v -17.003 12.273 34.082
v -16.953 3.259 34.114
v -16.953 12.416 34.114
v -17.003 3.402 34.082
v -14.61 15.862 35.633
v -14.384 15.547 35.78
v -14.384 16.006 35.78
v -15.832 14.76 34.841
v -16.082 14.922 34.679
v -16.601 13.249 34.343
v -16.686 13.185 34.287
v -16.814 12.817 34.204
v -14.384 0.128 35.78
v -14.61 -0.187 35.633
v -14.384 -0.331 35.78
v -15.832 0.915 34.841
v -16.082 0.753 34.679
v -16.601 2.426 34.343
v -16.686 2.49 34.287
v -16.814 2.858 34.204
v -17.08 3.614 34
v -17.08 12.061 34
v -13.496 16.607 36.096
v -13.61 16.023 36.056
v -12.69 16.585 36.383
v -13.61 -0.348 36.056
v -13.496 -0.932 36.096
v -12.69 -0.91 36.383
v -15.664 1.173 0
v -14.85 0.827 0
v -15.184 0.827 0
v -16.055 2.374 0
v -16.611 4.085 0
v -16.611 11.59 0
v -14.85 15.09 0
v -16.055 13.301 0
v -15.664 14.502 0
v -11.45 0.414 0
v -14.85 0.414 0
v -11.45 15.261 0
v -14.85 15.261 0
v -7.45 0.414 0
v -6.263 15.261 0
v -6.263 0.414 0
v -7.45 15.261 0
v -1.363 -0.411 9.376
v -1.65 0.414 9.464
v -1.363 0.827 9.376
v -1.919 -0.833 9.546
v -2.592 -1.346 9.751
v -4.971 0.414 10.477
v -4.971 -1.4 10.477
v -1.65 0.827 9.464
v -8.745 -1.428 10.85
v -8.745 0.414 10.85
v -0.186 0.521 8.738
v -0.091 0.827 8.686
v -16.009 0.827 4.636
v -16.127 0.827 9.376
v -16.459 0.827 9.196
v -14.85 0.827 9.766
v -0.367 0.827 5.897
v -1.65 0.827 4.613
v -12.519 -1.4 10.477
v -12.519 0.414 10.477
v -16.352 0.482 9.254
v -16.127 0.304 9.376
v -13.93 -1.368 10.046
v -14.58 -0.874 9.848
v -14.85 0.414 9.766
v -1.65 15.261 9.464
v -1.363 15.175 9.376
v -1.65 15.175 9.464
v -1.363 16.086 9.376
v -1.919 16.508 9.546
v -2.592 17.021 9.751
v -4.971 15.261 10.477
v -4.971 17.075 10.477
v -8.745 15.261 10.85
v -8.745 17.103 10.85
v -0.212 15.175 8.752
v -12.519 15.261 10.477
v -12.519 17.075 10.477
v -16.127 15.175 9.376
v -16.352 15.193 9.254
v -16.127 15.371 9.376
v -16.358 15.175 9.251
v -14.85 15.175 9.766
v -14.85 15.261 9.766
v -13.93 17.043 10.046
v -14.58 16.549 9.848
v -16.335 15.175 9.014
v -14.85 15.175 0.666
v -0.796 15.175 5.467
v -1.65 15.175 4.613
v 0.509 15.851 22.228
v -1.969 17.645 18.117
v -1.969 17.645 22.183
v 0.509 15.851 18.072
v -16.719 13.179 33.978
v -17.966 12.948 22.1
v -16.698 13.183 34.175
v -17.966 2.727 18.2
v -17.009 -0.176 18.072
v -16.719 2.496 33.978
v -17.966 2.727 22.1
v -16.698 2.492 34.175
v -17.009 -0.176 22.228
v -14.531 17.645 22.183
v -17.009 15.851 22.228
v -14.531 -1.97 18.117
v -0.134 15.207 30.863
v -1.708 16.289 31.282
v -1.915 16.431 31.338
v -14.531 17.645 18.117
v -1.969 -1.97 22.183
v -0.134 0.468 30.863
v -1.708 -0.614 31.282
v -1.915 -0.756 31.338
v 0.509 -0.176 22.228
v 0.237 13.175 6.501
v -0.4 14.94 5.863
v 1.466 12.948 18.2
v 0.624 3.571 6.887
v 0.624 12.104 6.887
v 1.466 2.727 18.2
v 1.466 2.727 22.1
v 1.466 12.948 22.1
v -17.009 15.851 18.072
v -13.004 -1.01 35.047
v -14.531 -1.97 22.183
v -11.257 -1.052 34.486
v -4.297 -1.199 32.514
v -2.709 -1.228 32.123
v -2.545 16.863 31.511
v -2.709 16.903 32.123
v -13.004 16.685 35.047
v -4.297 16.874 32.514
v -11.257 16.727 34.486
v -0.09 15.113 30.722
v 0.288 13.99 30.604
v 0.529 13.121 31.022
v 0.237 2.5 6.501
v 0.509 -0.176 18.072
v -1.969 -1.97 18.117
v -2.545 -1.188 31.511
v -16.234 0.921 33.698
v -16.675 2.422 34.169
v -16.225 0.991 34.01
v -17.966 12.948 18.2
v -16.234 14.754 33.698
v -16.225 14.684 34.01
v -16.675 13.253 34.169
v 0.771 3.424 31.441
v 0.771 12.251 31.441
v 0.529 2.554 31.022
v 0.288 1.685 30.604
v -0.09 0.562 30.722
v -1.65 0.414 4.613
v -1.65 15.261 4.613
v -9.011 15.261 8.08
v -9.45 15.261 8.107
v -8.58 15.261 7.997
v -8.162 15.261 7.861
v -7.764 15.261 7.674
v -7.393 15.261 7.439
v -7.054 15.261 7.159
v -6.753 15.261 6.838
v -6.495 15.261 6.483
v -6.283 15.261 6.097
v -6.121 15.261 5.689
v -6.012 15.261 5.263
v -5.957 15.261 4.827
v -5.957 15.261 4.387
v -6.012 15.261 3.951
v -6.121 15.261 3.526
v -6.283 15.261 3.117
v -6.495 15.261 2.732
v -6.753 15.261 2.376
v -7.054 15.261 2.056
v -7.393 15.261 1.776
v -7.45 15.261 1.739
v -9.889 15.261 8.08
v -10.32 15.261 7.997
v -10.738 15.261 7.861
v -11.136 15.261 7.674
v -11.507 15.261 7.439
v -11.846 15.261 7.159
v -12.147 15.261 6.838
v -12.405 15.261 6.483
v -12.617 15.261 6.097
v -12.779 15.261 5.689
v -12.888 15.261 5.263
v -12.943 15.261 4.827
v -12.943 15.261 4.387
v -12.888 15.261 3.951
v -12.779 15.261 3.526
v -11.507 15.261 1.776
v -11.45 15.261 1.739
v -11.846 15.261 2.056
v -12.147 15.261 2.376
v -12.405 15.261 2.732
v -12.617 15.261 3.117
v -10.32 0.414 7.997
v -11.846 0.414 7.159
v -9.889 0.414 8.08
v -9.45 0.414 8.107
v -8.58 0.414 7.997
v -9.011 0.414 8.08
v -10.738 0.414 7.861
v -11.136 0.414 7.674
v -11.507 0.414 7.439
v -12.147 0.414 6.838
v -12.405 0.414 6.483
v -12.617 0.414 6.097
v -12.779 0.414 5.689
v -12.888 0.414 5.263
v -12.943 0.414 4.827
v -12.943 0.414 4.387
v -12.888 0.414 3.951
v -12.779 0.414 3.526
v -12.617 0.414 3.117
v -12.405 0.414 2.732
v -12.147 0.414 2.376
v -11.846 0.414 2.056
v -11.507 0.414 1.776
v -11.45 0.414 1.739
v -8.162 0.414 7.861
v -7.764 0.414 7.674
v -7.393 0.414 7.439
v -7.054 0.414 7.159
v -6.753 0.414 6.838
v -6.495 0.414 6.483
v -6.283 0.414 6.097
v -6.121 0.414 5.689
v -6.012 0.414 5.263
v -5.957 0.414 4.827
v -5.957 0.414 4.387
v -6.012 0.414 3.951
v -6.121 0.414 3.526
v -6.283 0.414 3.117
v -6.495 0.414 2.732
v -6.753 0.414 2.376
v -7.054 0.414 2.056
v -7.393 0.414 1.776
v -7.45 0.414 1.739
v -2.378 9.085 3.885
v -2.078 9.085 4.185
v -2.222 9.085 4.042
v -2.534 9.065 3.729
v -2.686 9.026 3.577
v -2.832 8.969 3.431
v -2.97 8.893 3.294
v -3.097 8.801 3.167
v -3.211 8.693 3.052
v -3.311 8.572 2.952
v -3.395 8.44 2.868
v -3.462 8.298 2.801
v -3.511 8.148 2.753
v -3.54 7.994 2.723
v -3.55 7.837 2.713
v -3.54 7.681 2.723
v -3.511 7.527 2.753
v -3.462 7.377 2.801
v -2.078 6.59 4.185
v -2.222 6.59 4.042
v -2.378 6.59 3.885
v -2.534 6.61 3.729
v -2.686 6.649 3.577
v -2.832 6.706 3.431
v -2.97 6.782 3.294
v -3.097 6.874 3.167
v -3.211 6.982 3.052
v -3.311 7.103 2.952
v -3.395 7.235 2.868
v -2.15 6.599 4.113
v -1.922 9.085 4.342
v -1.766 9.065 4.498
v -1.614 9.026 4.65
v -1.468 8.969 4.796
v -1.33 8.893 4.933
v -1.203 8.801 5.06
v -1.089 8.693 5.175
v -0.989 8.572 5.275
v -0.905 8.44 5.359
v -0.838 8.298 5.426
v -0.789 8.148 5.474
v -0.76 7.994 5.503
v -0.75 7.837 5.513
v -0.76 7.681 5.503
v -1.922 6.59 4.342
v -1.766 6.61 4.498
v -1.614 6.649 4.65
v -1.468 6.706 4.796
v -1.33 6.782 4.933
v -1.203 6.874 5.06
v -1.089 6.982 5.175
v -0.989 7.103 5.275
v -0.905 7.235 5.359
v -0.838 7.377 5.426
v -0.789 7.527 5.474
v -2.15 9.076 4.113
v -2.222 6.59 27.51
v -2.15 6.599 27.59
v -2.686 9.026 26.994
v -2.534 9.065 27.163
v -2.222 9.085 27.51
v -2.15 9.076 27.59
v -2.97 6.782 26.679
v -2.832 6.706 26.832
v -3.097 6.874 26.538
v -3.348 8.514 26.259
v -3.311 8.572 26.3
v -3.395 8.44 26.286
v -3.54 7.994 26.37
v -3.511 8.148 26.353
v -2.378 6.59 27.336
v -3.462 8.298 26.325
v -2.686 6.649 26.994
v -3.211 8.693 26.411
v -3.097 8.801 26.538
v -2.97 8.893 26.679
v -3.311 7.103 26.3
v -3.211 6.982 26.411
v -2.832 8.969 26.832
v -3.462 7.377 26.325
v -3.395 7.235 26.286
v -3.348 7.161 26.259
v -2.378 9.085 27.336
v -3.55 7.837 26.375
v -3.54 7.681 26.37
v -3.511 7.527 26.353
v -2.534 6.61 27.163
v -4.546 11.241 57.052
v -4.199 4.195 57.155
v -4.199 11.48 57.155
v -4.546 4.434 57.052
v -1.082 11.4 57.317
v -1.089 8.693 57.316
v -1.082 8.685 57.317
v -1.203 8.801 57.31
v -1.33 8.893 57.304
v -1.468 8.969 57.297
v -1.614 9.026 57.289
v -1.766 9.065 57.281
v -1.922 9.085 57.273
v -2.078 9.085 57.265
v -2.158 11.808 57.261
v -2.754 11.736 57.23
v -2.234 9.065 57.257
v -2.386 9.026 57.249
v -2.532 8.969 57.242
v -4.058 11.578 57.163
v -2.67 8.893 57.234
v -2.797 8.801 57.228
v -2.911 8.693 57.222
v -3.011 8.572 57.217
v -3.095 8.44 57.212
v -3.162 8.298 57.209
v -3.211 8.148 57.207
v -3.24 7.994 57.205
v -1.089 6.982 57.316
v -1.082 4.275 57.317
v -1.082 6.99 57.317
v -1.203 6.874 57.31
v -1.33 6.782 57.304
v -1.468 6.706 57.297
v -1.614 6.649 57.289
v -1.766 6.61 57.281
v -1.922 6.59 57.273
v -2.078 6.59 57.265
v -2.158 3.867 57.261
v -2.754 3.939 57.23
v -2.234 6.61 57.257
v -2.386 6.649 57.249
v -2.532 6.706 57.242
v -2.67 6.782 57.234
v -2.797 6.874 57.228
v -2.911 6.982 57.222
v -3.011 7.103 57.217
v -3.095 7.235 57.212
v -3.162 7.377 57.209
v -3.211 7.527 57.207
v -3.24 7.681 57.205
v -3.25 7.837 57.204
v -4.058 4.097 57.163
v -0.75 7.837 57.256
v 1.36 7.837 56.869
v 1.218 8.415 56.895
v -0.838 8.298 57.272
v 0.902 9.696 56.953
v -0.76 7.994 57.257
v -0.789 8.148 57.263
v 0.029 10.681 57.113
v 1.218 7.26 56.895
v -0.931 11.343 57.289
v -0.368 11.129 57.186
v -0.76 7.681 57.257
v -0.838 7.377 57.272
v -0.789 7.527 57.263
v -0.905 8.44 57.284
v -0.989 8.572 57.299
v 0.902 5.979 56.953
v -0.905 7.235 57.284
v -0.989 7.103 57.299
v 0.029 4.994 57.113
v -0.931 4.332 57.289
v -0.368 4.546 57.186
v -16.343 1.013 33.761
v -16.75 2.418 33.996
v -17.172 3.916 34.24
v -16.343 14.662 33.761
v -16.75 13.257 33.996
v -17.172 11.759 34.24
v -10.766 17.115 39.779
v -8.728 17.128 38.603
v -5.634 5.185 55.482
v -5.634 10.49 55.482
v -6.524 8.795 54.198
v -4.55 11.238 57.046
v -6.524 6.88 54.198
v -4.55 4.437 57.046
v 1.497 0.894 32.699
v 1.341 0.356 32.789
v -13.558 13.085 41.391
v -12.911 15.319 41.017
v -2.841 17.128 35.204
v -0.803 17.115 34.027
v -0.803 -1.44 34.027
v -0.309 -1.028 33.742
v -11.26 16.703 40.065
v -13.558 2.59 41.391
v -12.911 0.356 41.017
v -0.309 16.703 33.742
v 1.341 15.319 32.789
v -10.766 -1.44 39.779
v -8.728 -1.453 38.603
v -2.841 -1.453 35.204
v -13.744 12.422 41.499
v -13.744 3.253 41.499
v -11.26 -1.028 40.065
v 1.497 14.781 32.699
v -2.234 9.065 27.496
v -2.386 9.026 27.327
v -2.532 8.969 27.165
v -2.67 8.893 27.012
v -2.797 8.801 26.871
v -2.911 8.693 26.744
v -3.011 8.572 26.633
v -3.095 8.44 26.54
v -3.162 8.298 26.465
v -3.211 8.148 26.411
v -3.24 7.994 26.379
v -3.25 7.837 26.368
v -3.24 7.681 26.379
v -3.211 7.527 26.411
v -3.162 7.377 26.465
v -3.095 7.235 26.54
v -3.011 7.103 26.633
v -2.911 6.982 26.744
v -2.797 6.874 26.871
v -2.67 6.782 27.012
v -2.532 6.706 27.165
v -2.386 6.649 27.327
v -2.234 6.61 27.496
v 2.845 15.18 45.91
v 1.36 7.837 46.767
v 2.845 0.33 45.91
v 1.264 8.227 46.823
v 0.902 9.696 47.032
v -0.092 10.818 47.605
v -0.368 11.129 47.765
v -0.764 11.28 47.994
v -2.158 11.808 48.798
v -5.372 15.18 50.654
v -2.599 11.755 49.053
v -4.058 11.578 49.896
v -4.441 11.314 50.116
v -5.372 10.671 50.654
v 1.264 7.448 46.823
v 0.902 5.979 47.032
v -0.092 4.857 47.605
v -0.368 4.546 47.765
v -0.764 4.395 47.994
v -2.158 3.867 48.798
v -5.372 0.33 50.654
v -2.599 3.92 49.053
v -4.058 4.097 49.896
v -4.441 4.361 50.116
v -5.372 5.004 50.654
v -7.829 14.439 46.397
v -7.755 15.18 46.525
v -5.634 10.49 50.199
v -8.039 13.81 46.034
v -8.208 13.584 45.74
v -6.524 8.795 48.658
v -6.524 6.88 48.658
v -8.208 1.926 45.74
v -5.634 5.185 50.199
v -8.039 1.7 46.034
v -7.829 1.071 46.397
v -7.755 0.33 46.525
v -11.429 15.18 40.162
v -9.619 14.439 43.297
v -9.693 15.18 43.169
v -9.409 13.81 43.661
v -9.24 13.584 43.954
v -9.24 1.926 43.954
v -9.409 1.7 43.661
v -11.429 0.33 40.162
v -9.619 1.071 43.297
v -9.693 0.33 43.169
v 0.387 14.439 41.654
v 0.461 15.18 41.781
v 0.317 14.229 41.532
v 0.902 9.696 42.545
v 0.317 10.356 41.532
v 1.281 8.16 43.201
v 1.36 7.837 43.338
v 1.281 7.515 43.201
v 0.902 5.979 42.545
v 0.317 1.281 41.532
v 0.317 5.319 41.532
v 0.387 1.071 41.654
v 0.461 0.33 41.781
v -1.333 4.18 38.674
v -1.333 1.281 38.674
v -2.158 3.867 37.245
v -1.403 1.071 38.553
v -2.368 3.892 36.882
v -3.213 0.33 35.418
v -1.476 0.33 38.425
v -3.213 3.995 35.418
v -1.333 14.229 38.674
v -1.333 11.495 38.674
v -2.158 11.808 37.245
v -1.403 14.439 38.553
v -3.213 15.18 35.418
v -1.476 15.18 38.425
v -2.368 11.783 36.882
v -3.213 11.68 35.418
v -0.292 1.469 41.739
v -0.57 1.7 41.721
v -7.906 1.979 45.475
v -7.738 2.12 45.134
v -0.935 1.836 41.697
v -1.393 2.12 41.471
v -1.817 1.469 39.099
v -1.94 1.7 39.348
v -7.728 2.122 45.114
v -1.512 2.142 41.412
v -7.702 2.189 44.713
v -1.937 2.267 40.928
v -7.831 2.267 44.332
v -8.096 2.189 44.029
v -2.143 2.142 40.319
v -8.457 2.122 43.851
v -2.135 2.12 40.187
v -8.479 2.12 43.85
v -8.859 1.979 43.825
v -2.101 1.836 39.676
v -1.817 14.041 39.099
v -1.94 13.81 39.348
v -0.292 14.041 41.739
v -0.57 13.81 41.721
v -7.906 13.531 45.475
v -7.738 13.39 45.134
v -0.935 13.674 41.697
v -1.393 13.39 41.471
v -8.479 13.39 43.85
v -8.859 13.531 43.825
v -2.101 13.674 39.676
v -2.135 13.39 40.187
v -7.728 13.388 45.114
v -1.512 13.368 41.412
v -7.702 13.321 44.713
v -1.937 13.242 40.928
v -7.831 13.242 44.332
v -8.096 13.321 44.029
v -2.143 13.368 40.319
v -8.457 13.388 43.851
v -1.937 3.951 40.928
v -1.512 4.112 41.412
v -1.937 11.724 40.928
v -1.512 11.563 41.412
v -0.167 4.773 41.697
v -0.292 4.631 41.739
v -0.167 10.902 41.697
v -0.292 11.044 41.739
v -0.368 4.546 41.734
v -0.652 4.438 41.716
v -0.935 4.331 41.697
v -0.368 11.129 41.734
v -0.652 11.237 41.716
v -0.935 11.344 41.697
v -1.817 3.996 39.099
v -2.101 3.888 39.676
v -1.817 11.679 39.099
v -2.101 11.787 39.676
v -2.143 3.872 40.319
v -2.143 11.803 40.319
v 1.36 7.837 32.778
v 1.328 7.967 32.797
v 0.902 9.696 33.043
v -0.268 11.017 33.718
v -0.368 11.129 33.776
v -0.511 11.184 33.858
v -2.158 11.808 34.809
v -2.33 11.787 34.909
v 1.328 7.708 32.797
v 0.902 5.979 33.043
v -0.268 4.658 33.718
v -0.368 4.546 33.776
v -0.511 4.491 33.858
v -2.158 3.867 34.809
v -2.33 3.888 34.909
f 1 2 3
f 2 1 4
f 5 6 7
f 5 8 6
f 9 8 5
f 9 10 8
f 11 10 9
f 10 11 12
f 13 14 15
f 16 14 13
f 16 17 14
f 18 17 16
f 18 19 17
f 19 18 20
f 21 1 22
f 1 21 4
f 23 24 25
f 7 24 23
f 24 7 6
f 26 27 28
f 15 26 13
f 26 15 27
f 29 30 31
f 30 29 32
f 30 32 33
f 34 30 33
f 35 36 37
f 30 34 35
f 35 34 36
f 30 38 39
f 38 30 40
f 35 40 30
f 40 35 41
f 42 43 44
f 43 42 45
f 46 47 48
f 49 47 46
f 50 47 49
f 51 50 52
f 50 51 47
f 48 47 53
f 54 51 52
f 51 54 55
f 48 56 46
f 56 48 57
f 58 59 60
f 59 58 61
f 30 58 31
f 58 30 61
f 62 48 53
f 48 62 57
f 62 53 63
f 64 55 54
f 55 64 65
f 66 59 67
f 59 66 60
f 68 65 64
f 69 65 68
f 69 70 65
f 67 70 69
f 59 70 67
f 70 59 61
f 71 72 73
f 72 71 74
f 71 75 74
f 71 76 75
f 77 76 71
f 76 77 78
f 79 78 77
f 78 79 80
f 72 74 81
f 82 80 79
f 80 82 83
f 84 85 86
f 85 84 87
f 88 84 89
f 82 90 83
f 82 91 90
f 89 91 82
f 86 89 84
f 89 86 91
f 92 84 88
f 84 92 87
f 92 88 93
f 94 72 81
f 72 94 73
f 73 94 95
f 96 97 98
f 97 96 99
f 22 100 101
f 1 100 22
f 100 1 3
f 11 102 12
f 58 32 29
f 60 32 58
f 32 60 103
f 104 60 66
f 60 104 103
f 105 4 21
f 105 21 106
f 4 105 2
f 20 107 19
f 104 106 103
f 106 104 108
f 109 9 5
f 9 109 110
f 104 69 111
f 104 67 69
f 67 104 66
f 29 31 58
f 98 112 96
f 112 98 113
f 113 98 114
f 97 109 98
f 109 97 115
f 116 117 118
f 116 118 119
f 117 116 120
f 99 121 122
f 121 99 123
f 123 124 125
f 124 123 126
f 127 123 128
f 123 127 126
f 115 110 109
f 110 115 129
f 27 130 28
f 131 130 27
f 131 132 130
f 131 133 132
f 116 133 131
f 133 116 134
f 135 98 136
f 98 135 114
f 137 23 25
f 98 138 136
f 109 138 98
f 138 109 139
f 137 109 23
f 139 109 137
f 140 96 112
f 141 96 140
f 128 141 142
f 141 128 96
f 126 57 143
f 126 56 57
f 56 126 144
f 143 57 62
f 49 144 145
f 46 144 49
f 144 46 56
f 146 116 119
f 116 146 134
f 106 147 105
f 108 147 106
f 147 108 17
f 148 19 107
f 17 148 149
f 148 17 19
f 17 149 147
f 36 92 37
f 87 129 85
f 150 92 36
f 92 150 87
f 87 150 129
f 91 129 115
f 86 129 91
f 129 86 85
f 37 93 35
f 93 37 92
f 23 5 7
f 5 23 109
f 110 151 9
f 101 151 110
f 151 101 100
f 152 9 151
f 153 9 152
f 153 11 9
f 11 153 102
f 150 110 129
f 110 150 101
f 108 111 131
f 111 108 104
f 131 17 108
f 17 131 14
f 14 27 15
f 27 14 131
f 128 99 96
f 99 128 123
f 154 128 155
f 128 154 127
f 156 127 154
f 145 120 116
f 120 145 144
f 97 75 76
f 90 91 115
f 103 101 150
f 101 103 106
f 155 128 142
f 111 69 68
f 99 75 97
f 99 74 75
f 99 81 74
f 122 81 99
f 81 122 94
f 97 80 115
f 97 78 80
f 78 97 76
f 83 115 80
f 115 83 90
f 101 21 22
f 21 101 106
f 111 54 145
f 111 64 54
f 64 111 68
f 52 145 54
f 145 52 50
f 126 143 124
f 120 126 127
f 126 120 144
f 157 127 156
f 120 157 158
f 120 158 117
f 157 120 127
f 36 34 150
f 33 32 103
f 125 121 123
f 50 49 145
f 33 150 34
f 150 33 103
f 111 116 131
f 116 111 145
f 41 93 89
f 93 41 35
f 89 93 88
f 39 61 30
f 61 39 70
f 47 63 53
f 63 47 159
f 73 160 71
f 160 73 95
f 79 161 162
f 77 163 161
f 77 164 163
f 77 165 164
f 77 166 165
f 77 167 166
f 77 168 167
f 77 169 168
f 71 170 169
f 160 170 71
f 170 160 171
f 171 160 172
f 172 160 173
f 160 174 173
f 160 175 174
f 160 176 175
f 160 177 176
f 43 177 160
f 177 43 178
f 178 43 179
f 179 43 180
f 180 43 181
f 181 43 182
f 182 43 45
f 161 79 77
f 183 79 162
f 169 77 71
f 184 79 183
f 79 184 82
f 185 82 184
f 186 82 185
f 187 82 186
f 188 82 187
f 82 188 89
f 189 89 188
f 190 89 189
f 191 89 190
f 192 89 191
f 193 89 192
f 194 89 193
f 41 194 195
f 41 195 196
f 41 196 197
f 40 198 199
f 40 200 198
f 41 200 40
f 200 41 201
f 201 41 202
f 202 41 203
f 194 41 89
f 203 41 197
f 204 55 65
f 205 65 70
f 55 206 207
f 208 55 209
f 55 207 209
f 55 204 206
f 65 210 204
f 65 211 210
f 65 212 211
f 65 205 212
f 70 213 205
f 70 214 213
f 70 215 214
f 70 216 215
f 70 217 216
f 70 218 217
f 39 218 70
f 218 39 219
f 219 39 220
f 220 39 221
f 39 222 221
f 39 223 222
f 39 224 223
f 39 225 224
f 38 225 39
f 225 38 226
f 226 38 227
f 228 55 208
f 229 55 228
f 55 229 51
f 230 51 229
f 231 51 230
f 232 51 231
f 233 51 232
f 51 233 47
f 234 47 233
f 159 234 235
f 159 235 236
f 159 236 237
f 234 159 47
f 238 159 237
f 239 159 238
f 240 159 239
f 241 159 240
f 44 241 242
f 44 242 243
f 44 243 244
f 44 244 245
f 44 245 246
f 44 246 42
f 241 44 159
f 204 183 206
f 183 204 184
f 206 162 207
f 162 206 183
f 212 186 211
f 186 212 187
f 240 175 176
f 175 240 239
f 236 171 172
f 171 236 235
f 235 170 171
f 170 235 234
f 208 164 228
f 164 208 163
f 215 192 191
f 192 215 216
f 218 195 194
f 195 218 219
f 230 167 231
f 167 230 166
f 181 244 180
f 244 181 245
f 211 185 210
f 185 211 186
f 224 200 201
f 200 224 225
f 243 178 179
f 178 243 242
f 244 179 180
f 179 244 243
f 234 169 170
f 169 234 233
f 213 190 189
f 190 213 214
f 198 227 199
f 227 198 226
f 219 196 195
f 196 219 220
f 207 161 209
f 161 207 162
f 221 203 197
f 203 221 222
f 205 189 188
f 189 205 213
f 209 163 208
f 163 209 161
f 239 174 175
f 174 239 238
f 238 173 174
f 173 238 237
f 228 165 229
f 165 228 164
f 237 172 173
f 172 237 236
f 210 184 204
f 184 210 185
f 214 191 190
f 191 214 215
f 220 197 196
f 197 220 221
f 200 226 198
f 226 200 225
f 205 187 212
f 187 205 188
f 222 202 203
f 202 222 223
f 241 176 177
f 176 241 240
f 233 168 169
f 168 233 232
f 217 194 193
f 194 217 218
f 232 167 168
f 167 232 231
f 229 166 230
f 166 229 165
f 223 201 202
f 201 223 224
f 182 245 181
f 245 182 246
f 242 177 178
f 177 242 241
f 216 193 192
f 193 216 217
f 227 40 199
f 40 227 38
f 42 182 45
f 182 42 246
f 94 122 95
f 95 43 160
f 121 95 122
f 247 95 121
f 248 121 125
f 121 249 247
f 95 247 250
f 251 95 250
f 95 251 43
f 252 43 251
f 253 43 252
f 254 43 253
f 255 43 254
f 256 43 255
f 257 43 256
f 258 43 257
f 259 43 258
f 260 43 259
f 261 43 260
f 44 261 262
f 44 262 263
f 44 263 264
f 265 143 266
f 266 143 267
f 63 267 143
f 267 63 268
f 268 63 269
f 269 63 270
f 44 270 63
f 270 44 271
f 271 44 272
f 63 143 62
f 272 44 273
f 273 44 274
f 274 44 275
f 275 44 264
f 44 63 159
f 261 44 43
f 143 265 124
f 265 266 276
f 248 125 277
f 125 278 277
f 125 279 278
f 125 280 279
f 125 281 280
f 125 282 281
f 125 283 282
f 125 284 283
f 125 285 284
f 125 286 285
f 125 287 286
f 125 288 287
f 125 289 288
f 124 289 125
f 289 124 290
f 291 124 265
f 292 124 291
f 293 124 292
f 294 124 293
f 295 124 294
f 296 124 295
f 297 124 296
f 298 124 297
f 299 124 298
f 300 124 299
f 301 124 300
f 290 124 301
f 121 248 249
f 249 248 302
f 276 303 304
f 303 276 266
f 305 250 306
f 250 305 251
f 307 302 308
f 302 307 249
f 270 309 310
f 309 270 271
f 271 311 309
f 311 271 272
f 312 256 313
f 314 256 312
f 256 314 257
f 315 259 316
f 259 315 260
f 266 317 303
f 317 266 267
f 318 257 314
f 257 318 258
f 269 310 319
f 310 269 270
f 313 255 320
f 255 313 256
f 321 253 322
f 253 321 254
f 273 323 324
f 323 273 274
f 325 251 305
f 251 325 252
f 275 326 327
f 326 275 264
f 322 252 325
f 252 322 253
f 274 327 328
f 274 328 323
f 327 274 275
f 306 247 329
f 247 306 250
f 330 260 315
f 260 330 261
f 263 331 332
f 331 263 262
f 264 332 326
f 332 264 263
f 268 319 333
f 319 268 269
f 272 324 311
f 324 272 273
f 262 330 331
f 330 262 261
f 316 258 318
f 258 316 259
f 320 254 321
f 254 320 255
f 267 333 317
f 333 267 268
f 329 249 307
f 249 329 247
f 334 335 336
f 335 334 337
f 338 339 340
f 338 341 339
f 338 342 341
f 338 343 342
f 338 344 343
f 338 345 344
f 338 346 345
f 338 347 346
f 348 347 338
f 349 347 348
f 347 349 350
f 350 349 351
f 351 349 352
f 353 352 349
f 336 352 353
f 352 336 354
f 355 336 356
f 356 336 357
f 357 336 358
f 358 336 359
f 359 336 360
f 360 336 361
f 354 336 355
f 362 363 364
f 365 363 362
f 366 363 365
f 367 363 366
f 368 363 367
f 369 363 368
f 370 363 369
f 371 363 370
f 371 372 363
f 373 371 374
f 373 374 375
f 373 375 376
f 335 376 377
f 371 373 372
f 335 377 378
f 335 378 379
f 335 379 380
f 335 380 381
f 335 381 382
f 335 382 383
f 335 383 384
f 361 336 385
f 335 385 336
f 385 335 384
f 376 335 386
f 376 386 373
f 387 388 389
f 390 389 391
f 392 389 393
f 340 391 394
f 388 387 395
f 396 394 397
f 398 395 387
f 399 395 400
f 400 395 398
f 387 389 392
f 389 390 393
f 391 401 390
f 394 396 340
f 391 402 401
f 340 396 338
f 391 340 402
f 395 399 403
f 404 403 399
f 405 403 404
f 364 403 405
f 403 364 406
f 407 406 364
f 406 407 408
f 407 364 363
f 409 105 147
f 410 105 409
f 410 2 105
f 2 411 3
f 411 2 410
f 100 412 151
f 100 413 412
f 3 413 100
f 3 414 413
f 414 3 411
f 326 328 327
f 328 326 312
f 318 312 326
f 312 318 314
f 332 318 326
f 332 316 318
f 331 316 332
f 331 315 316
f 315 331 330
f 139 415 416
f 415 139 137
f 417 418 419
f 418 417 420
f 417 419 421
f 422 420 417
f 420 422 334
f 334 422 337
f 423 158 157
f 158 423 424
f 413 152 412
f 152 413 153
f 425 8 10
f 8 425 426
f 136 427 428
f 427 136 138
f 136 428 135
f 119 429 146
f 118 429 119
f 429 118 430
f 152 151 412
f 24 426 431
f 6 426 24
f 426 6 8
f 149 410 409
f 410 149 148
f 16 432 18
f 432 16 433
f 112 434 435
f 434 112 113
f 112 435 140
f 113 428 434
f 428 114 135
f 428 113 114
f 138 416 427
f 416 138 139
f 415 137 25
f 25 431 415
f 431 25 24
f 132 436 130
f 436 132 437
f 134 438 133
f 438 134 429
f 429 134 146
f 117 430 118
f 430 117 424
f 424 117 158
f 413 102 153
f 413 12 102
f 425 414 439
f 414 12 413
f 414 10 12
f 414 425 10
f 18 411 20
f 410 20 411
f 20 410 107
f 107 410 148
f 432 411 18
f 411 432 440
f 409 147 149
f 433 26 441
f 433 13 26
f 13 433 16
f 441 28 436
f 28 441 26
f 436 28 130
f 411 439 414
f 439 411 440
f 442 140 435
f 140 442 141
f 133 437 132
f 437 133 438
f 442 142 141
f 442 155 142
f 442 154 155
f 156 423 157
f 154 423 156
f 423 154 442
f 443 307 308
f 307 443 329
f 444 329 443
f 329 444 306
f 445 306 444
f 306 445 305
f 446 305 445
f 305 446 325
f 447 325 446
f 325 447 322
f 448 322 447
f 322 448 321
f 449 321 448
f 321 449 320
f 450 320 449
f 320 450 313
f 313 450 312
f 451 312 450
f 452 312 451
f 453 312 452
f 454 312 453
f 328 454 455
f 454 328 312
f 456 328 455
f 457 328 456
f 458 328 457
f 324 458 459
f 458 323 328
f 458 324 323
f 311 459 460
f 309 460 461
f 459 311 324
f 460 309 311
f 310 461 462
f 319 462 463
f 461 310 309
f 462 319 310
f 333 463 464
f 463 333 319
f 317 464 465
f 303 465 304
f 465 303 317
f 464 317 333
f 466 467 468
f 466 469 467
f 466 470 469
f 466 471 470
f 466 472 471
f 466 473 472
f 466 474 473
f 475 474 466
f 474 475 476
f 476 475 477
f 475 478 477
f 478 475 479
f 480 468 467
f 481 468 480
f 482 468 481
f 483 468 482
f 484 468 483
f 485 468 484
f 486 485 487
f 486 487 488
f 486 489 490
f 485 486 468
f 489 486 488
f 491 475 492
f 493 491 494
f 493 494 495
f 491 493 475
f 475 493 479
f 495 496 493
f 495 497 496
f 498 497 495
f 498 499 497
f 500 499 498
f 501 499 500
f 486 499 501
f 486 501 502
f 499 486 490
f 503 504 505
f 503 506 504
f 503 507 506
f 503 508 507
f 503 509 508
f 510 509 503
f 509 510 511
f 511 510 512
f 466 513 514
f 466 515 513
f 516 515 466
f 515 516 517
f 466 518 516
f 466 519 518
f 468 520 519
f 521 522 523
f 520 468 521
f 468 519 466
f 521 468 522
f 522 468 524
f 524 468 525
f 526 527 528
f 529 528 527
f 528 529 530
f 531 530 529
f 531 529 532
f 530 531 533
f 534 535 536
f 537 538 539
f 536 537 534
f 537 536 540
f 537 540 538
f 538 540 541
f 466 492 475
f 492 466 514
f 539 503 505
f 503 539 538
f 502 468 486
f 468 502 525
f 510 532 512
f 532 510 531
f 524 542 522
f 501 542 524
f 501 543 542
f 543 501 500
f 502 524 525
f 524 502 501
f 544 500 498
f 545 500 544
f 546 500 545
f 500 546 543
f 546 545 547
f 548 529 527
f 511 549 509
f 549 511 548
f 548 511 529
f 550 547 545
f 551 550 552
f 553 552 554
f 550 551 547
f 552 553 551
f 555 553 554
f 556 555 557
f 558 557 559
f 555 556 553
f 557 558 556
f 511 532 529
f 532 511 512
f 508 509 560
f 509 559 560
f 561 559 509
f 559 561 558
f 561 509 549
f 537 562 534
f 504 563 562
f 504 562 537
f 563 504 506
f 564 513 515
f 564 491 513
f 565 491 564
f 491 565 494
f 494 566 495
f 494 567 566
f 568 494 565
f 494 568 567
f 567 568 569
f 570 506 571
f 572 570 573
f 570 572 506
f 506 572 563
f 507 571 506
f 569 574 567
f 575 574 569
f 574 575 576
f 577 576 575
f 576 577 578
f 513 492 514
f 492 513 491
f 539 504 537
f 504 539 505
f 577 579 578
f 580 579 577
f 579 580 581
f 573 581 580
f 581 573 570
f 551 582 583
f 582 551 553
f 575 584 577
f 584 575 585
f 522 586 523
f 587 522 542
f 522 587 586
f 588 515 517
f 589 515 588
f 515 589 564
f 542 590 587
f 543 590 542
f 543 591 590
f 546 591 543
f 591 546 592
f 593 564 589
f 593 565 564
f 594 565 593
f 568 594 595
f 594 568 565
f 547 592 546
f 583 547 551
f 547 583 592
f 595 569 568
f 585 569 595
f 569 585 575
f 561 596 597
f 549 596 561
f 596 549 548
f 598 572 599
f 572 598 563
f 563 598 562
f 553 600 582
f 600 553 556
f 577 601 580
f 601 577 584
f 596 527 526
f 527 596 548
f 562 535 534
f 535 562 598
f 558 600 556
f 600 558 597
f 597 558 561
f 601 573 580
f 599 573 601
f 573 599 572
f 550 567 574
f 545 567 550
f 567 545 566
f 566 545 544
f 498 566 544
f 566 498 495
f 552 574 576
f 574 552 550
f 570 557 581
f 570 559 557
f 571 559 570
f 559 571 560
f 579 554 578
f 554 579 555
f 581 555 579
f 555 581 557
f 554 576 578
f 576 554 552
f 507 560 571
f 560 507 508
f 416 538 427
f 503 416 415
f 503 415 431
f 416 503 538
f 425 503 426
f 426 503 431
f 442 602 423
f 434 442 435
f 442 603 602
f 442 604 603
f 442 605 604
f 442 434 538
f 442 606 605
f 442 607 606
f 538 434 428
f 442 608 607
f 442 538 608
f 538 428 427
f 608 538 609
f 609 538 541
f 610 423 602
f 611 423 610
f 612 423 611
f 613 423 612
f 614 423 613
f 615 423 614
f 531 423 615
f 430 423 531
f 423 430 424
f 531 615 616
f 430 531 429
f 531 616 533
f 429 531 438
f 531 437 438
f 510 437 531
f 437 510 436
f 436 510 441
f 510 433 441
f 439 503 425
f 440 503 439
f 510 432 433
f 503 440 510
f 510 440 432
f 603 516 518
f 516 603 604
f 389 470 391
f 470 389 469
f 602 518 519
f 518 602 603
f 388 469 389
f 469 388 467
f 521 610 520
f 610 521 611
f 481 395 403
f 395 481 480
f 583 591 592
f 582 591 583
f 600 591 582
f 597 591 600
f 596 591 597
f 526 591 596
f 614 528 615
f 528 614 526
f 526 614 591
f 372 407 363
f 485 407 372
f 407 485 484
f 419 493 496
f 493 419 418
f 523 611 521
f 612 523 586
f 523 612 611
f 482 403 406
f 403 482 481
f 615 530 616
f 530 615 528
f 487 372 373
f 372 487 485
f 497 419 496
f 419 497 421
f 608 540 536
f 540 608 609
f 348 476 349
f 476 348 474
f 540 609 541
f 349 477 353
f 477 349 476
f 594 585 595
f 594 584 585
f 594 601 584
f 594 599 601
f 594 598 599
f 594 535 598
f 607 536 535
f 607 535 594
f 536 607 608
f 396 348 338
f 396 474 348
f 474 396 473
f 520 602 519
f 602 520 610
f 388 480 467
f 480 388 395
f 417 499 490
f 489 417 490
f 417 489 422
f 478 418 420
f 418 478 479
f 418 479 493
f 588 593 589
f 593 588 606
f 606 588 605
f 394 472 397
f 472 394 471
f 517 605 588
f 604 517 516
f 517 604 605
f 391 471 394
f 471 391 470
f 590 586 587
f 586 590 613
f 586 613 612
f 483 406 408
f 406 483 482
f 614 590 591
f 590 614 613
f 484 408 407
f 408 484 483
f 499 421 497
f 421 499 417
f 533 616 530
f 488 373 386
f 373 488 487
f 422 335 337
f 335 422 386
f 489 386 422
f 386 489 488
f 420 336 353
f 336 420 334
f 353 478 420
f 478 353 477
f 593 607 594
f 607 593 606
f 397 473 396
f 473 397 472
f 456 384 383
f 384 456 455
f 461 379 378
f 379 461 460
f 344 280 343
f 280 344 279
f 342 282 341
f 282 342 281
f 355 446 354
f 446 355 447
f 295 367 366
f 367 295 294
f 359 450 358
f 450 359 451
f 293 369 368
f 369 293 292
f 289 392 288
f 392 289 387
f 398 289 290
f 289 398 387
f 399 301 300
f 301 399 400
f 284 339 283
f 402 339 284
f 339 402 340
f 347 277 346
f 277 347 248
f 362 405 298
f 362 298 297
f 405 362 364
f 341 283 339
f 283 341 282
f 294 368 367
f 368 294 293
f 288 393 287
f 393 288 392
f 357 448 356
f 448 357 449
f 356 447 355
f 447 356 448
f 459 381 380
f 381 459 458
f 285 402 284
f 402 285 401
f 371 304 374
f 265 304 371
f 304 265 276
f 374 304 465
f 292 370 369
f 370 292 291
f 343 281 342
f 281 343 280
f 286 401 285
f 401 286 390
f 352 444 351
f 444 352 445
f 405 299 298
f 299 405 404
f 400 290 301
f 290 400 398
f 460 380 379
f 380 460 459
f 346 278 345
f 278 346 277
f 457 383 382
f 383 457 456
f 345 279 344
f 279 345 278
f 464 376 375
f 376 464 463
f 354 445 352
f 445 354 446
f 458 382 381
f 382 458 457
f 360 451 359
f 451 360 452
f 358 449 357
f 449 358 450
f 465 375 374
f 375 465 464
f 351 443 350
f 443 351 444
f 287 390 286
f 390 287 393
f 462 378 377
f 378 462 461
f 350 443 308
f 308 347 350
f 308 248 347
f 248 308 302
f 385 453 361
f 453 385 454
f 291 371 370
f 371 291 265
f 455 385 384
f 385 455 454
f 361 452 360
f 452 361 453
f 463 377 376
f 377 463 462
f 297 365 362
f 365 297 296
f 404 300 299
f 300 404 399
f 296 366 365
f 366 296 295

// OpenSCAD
// file: finger_mid.scad
include <../../config.scad>
use <finger_base.scad>

rotate([0,-90,0]) fingermid();

//	Middle segment of finger, can be lengthened
module fingermid(length=19, proximalHole=true, distalHole=true)
{
	difference() {
		scale([yScaleFactor,xScaleFactor,zScaleFactor]) {
			fingerbasesolid(length);
		}
		if(proximalHole) {
			translate([0,knucklePadding/2 * xScaleFactor,0]) fingerhardwarecutouts(jointDia, jointThick, knuckleW=knuckleW-knucklePadding, fingerLen=length);
		}
		if(distalHole) {
			translate([length * yScaleFactor,0,0]) mirror([1,0,0]) fingerhardwarecutouts(jointDia, jointThick, knuckleW=knuckleW, fingerLen=length);
		}
	}
}
// file: finger_base.scad
include <../../config.scad>

rotate([0,-90,0]) fingerbase();

//	Base segment of finger, can be lengthened
module fingerbase(length=20, proximalHole=true, distalHole=true)
{
	difference() {
		scale([yScaleFactor,xScaleFactor,zScaleFactor]) {
			fingerbasesolid(length);
		}
		if(proximalHole) {
			translate([0,knucklePadding/2 * xScaleFactor,0]) fingerhardwarecutouts(jointDia, jointThick, knuckleW=knuckleW-knucklePadding, fingerLen=length);
		}
		if (distalHole) {
			translate([length * yScaleFactor,0,0]) mirror([1,0,0]) fingerhardwarecutouts(jointDia, jointThick, knuckleW=knuckleW, fingerLen=length);
		}
	}


	
}

module fingerhardwarecutouts(jointDia,jointThick,knuckleW,fingerLen,holeCutoff=100) {
	//slot for flex joint
	translate([7 - (15/jointDia),0,6*zScaleFactor - (1.8/jointThick)]) {
		rotate([90,0,0]) translate([-0.25,0,-knuckleW*xScaleFactor]) cylinder(d=jointDia, h=knuckleW*xScaleFactor, $fn=50);
		translate([-25,(knuckleW*xScaleFactor) / 2,0]) cube([50,knuckleW*xScaleFactor,jointThick], center=true);
	}
	//cubic parts
	translate([-100,0,0]) cube([100,knuckleW*xScaleFactor,100]);
	translate([-13/zScaleFactor,0,0]) rotate([0,45,0]) translate([-50,0,0]) cube([100,knuckleW * xScaleFactor, 10]);

	//channel for string/tendon
	translate([-fingerLen/2 * yScaleFactor, knuckleW/2 * xScaleFactor, 2.3]) rotate([0,90,0]) cylinder(d=2.5, h=holeCutoff, $fn=50);
}

//	base segment of finger, solid
module fingerbasesolid(length=50, cutout=true) {
	difference() {
		//cubic part
		translate([0,0.001 + knucklePadding/2,1]) cube([length, knuckleW - knucklePadding - 0.002, 8]);
	}
	
	//cylindrical-ish part around finger
	intersection() {
		//overly large shape to get the cross section in the XZ plane from
		difference() {
			union() {
				translate([length-4,-5,5]) rotate([-90,0,0]) cylinder(r=8,h=knuckleW + 10);
				translate([0,-5,-5]) cube([length,knuckleW + 10,20]);
			}
			//cutout for the side "guards" of the previous knuckle
			if(cutout) {
				translate([-4,-knuckleW+0.001,5.3]) rotate([-90,0,0]) cylinder(r=11,h=10);
				translate([-4,knuckleW - knucklePadding*(1/xScaleFactor),5.3]) rotate([-90,0,0]) cylinder(r=11,h=10);
			}
		}

		hull() {
			for(i=[-1,1], j=[-1,1]) {
				//angled cylinders to provide the outer shape of the finger
				translate([length/10,i*2.4 + knuckleW/2,j*2.2 + 5]) rotate([i*j*-4,j*86,0]) cylinder(d=6,h=20,center=true);
				translate([length+4, i*2.4 + knuckleW/2, j*2.2 + 5]) rotate([i*j*-4,j*-86,0]) cylinder(d=6,h=20,center=true);
			}
		}
	}
}
// file: ../../config.scad
/**
 * Configuration settings for Flexy Beast, required to generate correctly sized STLs of the printed parts. See the Configuration File Assembly instructions to set this up.
 * @id config_file
 * @name Configuration File
 * @category Prerequisites!
 * @step Open config.scad in your favorite text editor.
 * @step As per the normal Cyborg Beast instructions, measure the width of the knuckles in the non-affected hand and convert to millimeters.
 * @step Add 5 to that result and then divide by 55.
 * @step Replace the x-, y-, and zScaleFactor variables in config.scad with that number.
 * @step If desired, adjust the proportions of the hand by changing those variables individually. xScaleFactor controls the width of the hand, yScaleFactor controls the length, and zScaleFactor controls the height.
 * @step Open assembly.scad in OpenSCAD to check that the flexy joint holes are not too large for the hand (should only be necessary for small children). If necessary, reduce the jointDia and jointThick variables. jointDia=5 and jointThick=2 is a good amount for smaller hands.
 * @step Set the fingerPads variable to true or false depending on whether you want to cast silicone finger pads for improved grip.
 * @step Open palm.scad, finger_base.scad, finger_tip.scad, and thumb_tip.scad in OpenSCAD, render each part (F6), and export as STL, then print. Suggested print settings are 0.2mm or smaller layer height, 3 perimeters, and 25% rectilinear or hexagonal infill.
 */

knuckleR = 4.85;
knucklePadding = 0.5;
knuckleW = 9.5;
wristH = 10;
palmH = 20;
palmW = 64;
th = 3;
fn = 32;

//flexy joint parameters
jointDia = 7;
jointThick = 4;

//finger settings
fingerPads = true; //whether or not to hollow the finger tips slightly for molding pads
fingerLength = 1; //multiply the length of all fingers by this amount
thumbProp = 0.8; //proportion of thumb length relative to other fingers (note that the thumb is a segment shorter than the other fingers already)
indexProp = 0.8; //proportion of index finger length relative to other fingers
middleProp = 1; //proportion of middle finger length relative to other fingers
ringProp = 0.8; //proportion of ring finger length relative to other fingers
pinkyProp = 0.7; //proportion of pinky finger length relative to other fingers

//misc settings
thermoform = true; //whether or not to generate a thermoformable mesh for the palm

//desired scale factor for hand based on the standard Cyborg Beast/Robohand sizing guide
xScaleFactor = 1.65; // [1.05:1.60]
yScaleFactor = 1.55; // [1.05:1.60]
zScaleFactor = 1.65; // [1.05:1.60]
// main file
include <../../config.scad>
use <finger_base.scad>
use <finger_mid.scad>

rotate([0,-90,0]) fingertip_curved_solid(pad=fingerPads);

module fingertip_curved_solid(length=17, pad=true, hole=true) {
//	if (!pad)
//		fingertip(length=length);
//	else {
		render() difference() {
			union() {
				fingermid(length=length+3, proximalHole=true, distalHole=false);
				translate([length*yScaleFactor - 0.5,0,1.6*zScaleFactor]) rotate([0,30,0]) fingertip(length=15, proximalHole=false, cutout=false);
			}
			//hole for string
			if(hole) translate([0,xScaleFactor * knuckleW/2,2]) rotate([0,90,0]) cylinder(d=2.5,h=100, $fn=50);
			//hollow for soft pad
			if(pad) translate([length*yScaleFactor - 0.5,0,1.6*zScaleFactor]) rotate([0,30,0]) fingertip_pad(length=15);
		}
//	}
}

module fingertip_solid(length=15, pad=true) {
	if (!pad)
		fingertip(length=length);
	else {
		render() difference() {
			fingertip(length=length);
			if(pad) fingertip_pad(length);
		}
	}
}

module fingertip_pad(length) {
	difference() {
		fingertip(length,pad=false, proximalHole=false, cutout=false);
		translate([0,-10,-10]) cube([length-7,50,50]);
		assign($fn = 16) difference() {
			translate([0,0.2*xScaleFactor,3.2*zScaleFactor]) cube([length+(3.3*yScaleFactor),xScaleFactor * (knuckleW - knucklePadding),5.75*zScaleFactor]);
			//grooves for attachment of silicone pad:
			translate([(length+(3.3*yScaleFactor))/3*2, 0.2*xScaleFactor, 3.2*zScaleFactor]) cylinder(d=2.5*yScaleFactor,h=5.75*zScaleFactor);
			translate([(length+(3.3*yScaleFactor))/3*2, 0.2*xScaleFactor + (xScaleFactor * (knuckleW - knucklePadding)), 3.2*zScaleFactor]) cylinder(d=2.5*yScaleFactor,h=5.75*zScaleFactor);
			translate([(length+(3.3*yScaleFactor))/3*2, 0.2*xScaleFactor, 3.2*zScaleFactor]) rotate([-90,0,0]) cylinder(d=2*zScaleFactor,h=xScaleFactor * (knuckleW - knucklePadding));
			translate([(length+(3.3*yScaleFactor))/3*2, 0.2*xScaleFactor, 3.2*zScaleFactor + 5.75*zScaleFactor]) rotate([-90,0,0]) cylinder(d=1.25*zScaleFactor,h=xScaleFactor * (knuckleW - knucklePadding));
		}
		//"fingernail":
		translate([0,xScaleFactor * knuckleW/2,0]) {
			rotate([0,60,0]) cylinder(d=8, h=100);
		}
	}
}

//	tip segment of finger, can be lengthened
module fingertip(length=15, proximalHole=true, cutout=true)
{
	intersection() {
		difference() {
			scale([yScaleFactor,xScaleFactor,zScaleFactor]) {
				fingerbasesolid(length,cutout);
			}
			if(proximalHole) {
				translate([0,knucklePadding/2 * xScaleFactor,0]) fingerhardwarecutouts(jointDia, jointThick, knuckleW=knuckleW-knucklePadding, fingerLen=length, holeCutoff=(length-0.5)*2);
				translate([(length - 5) * yScaleFactor,(knuckleW/2) * xScaleFactor,0])
					rotate([0,30,0]) translate([0,0,2]) cylinder(d=2.5, h=100, $fn=50);
			}
		}
		translate([(length-10)*xScaleFactor,0,21*zScaleFactor]) rotate([-90,0,0]) cylinder(d=70, h=100, center=true);
	}
}
